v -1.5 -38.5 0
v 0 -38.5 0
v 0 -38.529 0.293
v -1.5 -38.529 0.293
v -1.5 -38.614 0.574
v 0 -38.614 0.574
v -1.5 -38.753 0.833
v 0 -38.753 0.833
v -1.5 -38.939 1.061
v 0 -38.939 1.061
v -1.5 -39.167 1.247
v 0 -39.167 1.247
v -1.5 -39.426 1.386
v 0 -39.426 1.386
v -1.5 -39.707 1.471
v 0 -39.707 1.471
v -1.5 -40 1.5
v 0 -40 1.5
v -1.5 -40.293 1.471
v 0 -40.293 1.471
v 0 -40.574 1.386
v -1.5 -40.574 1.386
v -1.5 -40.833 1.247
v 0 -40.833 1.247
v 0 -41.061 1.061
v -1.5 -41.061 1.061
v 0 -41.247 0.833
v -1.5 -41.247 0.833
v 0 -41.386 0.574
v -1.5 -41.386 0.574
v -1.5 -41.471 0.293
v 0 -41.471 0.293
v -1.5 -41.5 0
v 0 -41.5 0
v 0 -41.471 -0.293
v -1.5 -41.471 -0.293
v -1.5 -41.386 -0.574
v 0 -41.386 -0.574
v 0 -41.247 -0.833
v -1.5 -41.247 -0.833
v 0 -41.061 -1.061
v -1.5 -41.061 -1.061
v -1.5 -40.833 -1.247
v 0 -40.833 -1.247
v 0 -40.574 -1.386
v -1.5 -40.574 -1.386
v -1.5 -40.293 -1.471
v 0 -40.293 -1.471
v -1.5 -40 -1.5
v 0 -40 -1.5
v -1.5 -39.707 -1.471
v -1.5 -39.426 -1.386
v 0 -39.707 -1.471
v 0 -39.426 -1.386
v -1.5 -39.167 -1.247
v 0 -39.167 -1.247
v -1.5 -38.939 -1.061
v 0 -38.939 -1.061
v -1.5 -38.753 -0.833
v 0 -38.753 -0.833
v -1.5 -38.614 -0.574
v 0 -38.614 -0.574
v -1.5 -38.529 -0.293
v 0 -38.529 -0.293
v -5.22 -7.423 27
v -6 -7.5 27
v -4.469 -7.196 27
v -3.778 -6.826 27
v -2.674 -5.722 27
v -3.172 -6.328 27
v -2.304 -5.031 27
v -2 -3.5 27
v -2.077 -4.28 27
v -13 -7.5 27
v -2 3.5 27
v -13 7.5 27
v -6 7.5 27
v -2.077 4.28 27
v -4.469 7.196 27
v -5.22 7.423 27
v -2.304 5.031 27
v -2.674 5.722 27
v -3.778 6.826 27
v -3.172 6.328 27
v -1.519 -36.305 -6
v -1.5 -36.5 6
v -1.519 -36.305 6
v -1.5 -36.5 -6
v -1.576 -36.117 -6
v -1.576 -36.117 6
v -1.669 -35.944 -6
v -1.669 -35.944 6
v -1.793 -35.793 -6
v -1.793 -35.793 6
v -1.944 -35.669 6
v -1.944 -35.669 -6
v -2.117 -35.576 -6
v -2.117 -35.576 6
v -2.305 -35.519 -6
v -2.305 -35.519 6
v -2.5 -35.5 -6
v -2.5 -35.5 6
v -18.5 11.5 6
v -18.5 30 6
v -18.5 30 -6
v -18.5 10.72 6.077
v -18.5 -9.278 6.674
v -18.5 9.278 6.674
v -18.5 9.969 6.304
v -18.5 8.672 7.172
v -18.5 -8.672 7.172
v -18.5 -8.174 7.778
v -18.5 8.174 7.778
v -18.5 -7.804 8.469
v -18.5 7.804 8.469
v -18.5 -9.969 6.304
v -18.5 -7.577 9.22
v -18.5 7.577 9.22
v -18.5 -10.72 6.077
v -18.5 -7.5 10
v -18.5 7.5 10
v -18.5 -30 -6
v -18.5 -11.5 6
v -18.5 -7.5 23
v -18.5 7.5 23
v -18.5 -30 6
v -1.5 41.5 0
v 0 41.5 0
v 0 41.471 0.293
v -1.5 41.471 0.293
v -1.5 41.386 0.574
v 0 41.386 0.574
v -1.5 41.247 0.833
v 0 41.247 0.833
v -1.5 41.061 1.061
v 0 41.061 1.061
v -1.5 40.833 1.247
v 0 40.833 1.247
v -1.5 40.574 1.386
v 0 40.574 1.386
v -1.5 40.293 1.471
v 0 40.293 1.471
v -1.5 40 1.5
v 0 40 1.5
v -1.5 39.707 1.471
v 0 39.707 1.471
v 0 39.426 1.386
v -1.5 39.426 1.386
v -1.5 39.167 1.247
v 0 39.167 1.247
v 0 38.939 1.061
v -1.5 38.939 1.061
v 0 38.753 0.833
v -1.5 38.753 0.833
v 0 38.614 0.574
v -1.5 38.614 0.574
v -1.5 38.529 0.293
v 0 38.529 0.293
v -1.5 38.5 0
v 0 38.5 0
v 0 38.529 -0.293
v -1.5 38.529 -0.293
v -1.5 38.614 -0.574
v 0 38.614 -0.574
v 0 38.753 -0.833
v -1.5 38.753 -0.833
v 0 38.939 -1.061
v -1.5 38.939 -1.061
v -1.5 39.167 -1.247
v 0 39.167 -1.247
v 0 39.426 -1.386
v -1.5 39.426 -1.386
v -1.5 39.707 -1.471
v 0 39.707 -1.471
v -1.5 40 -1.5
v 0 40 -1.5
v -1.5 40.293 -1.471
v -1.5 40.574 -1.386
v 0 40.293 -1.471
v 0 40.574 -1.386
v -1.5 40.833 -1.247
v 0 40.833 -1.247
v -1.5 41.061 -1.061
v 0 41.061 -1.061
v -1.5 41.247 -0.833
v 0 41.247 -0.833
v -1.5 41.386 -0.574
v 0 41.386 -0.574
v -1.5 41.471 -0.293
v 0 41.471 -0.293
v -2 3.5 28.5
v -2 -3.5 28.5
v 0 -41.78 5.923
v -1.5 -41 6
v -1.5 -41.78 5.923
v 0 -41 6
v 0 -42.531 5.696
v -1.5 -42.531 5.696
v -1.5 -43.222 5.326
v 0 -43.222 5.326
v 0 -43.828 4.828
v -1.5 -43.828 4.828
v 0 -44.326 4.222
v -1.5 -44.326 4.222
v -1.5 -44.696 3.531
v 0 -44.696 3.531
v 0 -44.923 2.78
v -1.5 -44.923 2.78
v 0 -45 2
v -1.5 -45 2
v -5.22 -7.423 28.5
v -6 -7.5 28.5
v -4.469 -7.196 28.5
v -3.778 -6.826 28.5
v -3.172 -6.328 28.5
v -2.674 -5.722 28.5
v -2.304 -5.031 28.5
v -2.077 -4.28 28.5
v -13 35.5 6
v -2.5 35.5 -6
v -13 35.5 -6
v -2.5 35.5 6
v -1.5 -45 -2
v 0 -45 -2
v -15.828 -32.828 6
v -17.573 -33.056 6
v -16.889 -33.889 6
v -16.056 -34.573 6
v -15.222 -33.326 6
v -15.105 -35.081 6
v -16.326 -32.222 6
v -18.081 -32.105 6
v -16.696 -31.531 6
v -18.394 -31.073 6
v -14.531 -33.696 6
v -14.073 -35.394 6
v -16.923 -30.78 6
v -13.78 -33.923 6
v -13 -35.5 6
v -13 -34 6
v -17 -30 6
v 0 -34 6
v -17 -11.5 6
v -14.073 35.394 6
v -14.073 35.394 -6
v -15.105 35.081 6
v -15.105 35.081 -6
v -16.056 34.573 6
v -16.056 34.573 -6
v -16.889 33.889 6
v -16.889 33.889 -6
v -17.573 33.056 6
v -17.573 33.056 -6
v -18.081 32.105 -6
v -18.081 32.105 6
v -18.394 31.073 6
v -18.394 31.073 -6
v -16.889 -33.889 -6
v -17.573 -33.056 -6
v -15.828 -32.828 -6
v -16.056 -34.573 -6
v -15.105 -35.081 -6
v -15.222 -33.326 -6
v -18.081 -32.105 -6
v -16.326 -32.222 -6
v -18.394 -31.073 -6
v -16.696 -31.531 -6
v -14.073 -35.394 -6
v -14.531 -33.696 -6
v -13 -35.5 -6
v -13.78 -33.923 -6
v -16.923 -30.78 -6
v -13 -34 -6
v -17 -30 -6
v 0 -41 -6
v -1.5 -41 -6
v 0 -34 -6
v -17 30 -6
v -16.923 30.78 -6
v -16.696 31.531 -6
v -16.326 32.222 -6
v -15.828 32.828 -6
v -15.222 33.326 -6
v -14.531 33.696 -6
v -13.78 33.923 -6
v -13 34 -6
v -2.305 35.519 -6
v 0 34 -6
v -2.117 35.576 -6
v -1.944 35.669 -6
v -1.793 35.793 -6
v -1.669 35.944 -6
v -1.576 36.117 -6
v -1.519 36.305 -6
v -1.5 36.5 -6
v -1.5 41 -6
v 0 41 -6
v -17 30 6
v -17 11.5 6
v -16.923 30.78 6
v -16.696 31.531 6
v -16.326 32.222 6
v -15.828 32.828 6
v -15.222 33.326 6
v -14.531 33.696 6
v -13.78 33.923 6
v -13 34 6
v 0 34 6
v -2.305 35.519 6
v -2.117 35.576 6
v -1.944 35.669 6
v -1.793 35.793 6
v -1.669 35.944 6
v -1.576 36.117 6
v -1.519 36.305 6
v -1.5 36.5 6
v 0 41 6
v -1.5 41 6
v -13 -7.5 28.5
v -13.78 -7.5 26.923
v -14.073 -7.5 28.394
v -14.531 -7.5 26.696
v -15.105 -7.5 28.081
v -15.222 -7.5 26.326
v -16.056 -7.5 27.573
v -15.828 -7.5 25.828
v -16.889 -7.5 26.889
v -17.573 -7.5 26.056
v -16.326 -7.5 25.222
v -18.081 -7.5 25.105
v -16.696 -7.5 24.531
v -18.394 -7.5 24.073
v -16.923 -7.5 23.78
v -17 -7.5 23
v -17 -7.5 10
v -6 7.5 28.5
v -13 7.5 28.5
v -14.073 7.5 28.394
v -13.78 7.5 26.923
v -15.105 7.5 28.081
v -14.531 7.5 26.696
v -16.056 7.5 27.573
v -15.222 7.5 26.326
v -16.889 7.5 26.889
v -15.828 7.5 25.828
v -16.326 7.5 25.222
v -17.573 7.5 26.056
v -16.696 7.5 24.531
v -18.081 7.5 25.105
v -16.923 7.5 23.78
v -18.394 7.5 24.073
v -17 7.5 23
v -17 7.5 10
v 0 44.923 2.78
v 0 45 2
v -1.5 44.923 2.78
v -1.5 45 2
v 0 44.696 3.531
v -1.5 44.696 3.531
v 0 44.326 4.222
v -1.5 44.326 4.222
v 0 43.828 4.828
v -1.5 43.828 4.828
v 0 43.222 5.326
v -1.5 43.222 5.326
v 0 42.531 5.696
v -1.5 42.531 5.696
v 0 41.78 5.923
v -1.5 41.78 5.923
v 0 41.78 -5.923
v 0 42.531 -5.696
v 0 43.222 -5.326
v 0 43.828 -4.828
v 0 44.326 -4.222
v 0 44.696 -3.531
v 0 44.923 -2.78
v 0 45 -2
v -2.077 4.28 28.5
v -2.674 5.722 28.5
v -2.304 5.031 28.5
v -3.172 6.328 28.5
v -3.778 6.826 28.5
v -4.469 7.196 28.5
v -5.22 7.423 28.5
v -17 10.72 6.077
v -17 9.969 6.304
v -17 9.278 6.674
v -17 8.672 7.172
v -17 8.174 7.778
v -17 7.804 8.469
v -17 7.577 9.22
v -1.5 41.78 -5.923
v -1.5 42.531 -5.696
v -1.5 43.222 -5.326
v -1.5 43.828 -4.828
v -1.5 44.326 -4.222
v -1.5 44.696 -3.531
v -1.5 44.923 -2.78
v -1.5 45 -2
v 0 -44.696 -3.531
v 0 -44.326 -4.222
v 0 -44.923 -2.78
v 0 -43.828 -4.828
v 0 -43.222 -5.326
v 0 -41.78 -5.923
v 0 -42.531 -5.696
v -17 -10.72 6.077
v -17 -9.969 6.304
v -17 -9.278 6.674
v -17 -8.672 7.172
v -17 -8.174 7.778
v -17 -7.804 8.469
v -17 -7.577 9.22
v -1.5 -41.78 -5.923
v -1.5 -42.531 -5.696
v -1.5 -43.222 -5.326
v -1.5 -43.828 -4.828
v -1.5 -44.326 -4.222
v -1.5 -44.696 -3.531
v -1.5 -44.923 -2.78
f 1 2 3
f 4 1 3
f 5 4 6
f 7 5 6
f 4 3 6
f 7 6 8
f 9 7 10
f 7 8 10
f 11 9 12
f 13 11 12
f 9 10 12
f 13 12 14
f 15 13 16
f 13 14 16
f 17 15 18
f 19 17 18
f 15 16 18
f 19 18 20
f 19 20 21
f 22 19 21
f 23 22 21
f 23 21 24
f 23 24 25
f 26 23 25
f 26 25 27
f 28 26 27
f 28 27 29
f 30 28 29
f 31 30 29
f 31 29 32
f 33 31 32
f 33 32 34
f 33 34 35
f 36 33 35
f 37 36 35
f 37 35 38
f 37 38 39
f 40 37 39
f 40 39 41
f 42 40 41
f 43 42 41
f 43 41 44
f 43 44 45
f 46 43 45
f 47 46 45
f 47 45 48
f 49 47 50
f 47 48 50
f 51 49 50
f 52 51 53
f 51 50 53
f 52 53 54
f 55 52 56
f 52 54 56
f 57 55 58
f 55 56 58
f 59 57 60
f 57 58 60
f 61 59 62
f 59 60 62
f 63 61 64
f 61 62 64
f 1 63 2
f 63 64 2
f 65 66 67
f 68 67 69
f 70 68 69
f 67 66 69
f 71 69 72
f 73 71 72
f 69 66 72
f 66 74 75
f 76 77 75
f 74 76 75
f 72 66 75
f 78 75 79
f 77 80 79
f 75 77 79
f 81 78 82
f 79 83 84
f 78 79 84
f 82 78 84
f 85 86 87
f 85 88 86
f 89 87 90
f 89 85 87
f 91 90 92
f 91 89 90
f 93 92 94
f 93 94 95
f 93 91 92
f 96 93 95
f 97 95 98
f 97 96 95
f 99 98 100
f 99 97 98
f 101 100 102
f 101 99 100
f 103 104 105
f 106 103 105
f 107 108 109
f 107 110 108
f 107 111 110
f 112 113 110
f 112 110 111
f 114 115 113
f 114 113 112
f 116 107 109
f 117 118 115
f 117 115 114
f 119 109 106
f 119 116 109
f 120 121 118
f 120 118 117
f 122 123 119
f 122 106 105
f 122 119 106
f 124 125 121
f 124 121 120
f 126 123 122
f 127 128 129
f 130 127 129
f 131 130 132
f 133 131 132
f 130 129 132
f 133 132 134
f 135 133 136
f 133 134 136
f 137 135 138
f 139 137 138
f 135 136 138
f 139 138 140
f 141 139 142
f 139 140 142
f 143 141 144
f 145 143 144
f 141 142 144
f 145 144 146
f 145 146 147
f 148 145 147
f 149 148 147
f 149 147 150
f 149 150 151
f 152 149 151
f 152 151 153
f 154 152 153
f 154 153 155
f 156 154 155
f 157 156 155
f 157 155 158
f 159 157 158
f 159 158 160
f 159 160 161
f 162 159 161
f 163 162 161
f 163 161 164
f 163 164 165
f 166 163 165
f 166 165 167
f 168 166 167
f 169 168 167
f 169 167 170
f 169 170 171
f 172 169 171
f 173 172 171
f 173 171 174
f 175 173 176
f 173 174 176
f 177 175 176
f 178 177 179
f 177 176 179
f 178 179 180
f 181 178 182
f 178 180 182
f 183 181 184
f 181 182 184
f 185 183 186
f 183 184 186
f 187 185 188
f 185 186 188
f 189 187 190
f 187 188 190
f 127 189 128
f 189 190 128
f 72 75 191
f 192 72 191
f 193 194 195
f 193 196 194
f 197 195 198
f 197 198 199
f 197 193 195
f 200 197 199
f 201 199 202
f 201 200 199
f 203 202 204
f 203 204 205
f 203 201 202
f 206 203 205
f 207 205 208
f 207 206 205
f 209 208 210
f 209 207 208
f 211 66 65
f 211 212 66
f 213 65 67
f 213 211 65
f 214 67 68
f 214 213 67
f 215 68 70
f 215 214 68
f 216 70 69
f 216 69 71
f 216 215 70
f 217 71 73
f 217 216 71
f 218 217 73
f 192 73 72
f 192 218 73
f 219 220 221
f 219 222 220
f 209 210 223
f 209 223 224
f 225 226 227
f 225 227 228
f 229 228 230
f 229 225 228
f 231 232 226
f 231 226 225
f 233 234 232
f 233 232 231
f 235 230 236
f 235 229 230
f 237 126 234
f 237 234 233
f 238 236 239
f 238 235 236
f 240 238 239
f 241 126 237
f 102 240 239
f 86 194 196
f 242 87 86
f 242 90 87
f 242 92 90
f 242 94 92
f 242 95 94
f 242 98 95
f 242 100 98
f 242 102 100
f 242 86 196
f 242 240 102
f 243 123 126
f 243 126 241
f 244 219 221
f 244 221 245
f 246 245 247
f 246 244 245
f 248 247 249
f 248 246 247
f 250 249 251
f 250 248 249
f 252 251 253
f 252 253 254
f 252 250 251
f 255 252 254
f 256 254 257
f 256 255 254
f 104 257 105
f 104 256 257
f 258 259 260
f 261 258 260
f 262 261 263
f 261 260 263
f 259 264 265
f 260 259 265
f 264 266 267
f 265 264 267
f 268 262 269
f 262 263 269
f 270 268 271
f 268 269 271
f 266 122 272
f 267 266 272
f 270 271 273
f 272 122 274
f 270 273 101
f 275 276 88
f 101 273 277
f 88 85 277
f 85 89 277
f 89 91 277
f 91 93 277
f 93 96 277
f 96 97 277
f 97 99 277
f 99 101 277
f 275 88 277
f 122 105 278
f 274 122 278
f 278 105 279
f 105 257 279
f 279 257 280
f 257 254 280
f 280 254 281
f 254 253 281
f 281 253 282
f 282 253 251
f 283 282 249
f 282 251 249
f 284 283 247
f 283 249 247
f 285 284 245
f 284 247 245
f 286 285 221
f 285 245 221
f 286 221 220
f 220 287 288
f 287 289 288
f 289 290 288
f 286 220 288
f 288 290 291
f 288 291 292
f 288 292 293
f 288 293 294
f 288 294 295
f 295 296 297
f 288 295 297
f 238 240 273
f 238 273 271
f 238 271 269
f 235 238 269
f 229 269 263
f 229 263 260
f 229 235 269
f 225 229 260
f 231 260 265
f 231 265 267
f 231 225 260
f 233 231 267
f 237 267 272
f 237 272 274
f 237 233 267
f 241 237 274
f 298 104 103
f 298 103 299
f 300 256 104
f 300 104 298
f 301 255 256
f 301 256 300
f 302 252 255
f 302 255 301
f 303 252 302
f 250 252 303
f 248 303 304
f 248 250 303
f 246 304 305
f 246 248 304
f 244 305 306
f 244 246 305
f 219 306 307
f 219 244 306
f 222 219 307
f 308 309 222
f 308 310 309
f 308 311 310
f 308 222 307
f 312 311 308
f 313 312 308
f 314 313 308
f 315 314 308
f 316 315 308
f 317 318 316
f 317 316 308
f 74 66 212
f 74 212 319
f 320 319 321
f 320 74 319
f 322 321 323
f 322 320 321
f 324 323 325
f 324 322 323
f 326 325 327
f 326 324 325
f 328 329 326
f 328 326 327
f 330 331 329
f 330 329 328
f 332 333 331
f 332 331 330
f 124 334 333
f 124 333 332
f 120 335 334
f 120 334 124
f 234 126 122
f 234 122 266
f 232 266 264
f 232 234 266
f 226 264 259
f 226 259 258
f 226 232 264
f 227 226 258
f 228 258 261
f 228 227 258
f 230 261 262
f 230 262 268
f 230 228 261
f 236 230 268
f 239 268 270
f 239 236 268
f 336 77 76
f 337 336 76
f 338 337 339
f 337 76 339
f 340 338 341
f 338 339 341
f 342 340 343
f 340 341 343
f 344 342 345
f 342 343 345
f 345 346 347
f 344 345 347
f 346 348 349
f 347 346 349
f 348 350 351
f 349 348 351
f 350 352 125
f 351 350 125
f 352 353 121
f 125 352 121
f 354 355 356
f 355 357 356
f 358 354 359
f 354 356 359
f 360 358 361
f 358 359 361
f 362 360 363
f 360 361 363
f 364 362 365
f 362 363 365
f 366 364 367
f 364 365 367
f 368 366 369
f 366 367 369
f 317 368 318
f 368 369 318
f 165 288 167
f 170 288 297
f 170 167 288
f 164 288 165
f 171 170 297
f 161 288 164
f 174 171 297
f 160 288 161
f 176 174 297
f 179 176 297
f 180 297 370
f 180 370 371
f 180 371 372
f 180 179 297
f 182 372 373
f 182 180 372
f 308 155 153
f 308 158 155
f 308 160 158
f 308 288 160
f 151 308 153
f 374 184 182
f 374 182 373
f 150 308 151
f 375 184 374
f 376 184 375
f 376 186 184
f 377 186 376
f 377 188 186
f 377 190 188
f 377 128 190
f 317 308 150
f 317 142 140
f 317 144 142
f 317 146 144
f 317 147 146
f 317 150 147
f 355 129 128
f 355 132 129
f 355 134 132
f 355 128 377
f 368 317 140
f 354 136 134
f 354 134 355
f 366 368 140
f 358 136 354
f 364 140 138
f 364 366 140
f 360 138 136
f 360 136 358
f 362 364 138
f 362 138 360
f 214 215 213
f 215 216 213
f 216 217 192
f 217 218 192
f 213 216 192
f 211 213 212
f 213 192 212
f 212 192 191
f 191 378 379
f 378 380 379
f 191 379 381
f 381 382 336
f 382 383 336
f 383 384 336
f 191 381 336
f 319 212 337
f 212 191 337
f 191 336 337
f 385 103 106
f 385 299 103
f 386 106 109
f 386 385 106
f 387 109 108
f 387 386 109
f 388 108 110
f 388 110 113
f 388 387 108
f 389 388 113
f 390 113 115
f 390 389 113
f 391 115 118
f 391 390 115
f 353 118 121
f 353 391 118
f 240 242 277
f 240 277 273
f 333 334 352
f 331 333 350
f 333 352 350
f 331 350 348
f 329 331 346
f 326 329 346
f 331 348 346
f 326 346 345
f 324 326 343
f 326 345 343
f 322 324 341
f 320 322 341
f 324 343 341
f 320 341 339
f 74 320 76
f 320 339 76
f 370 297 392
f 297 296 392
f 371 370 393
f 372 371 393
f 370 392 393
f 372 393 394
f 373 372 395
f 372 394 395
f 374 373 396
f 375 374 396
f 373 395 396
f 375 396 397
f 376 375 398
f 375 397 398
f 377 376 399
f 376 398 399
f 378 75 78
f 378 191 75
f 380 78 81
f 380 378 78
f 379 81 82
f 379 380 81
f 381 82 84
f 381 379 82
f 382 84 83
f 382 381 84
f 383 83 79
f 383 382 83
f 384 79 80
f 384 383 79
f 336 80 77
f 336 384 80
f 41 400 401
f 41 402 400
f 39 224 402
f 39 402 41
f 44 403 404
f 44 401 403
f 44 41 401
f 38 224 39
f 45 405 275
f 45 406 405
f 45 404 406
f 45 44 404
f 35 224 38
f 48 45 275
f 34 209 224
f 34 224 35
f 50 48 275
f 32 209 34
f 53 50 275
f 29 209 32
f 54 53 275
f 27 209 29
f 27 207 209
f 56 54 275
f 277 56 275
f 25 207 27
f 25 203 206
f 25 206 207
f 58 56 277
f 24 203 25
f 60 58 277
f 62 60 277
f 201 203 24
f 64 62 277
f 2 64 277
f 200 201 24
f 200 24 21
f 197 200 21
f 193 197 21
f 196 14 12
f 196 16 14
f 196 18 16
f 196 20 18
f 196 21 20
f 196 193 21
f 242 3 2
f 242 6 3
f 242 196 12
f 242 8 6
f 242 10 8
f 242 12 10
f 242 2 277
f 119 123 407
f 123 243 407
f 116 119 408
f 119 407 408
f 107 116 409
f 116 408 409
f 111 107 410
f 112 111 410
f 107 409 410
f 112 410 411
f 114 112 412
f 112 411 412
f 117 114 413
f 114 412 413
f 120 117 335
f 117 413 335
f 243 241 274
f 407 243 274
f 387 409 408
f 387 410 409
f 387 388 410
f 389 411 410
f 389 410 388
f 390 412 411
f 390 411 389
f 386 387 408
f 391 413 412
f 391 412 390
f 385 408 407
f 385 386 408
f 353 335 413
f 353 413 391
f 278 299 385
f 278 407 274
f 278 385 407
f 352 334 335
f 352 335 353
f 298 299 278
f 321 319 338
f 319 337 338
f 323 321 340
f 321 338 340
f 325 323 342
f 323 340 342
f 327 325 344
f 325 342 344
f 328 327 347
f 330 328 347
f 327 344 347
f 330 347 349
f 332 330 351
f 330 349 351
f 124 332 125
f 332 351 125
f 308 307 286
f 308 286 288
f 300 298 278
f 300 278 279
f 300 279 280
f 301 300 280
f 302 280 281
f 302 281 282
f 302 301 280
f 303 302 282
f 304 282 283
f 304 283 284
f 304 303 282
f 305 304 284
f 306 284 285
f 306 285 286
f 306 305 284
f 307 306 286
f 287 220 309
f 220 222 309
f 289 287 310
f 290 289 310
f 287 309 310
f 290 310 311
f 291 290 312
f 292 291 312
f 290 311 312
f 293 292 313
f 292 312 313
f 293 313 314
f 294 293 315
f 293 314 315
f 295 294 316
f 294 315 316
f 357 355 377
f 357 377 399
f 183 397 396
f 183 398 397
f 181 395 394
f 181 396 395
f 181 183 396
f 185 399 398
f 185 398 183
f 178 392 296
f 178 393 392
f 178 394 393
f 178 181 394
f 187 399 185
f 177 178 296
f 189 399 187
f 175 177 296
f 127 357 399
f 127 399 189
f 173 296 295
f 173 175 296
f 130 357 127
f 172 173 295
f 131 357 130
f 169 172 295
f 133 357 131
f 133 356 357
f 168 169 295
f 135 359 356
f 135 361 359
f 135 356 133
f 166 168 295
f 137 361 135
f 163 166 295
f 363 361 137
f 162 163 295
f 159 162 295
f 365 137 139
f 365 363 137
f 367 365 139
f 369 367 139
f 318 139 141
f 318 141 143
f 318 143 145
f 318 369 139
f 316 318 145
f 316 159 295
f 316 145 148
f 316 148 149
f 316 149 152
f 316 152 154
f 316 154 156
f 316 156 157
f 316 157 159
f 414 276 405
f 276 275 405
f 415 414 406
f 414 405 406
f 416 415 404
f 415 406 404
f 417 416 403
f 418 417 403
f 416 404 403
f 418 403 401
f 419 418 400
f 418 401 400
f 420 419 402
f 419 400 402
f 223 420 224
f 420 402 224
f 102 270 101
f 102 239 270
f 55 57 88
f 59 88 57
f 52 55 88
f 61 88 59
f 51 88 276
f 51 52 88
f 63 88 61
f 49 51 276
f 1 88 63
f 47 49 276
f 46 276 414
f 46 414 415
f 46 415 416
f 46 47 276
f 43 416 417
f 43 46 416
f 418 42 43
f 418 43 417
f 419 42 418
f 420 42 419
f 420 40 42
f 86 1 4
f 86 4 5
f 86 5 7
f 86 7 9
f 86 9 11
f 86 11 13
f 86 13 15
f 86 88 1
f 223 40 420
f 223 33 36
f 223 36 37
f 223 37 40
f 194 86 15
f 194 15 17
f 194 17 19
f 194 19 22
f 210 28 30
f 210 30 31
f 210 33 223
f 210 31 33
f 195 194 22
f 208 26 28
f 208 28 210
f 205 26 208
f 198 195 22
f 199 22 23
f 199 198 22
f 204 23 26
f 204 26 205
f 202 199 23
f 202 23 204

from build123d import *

# Parameters (mm, degrees)
EXTRU_MINCE1_DEPTH      = 6
EXTRU_MINCE2_DEPTH      = 7.5
CONG_1_R                = 4
CONG_2_R                = 1
ESQUISSE3_R             = 1.5
ENL_V_MAT_EXTRU_1_DEPTH = 57.387055252


with BuildPart() as part:
    # Esquisse1 → Extru.-Mince1 (new, symmetric)
    with BuildSketch(Plane.XY):
        with BuildLine():
            Line((0, -45), (0, -34))
            Line((0, -34), (-13, -34))
            ThreePointArc((-13, -34), (-15.828427125, -32.828427125), (-17, -30))
            Line((-17, -30), (-17, 30))
            ThreePointArc((-17, 30), (-15.828427125, 32.828427125), (-13, 34))
            Line((-13, 34), (0, 34))
            Line((0, 34), (0, 45))
            Line((0, 45), (-1.5, 45))
            Line((-1.5, 45), (-1.5, 35.5))
            Line((-1.5, 35.5), (-13, 35.5))
            ThreePointArc((-13, 35.5), (-16.889087297, 33.889087297), (-18.5, 30))
            Line((-18.5, 30), (-18.5, -30))
            ThreePointArc((-18.5, -30), (-16.889087297, -33.889087297), (-13, -35.5))
            Line((-13, -35.5), (-1.5, -35.5))
            Line((-1.5, -35.5), (-1.5, -45))
            Line((-1.5, -45), (0, -45))
        make_face()
    extrude(amount=EXTRU_MINCE1_DEPTH, both=True)

    # Esquisse2 → Extru.-Mince2 (add, symmetric)
    with BuildSketch(Plane(origin=(0, 0, 0), x_dir=(1, 0, 0), z_dir=(0, 1, 0))):
        with BuildLine():
            Line((-17, -6), (-17, -23))
            ThreePointArc((-17, -23), (-15.828427125, -25.828427125), (-13, -27))
            Line((-13, -27), (-2, -27))
            Line((-2, -27), (-2, -28.5))
            Line((-2, -28.5), (-13, -28.5))
            ThreePointArc((-13, -28.5), (-16.889087297, -26.889087297), (-18.5, -23))
            Line((-18.5, -23), (-18.5, -6))
            Line((-18.5, -6), (-17, -6))
        make_face()
    extrude(amount=EXTRU_MINCE2_DEPTH, both=True)

    # Congé1
    cong_1_edges = [part.edges().sort_by_distance(p)[0] for p in [
        (-0.75, 45, -6),
        (-0.75, 45, 6),
        (-2, 7.5, 27.75),
        (-2, -7.5, 27.75),
        (-0.75, -45, -6),
        (-0.75, -45, 6),
        (-17.75, -7.5, 6),
        (-17.75, 7.5, 6),
    ]]
    fillet(cong_1_edges, radius=CONG_1_R)

    # Congé2
    cong_2_edges = [part.edges().sort_by_distance(p)[0] for p in [
        (-1.5, -35.5, 0),
        (-1.5, 35.5, 0),
    ]]
    fillet(cong_2_edges, radius=CONG_2_R)

    # Esquisse3 → Enlèv. mat.-Extru.1 (cut, through all)
    with BuildSketch(Plane(origin=(0, 0, 0), x_dir=(0, 0, -1), z_dir=(1, 0, 0))):
        with Locations(Location((0, 40, 0), (0, 0, 90))):
            Circle(ESQUISSE3_R)
        with Locations(Location((0, -40, 0), (0, 0, 90))):
            Circle(ESQUISSE3_R)
    extrude(amount=-ENL_V_MAT_EXTRU_1_DEPTH, mode=Mode.SUBTRACT)


solid = part.part
